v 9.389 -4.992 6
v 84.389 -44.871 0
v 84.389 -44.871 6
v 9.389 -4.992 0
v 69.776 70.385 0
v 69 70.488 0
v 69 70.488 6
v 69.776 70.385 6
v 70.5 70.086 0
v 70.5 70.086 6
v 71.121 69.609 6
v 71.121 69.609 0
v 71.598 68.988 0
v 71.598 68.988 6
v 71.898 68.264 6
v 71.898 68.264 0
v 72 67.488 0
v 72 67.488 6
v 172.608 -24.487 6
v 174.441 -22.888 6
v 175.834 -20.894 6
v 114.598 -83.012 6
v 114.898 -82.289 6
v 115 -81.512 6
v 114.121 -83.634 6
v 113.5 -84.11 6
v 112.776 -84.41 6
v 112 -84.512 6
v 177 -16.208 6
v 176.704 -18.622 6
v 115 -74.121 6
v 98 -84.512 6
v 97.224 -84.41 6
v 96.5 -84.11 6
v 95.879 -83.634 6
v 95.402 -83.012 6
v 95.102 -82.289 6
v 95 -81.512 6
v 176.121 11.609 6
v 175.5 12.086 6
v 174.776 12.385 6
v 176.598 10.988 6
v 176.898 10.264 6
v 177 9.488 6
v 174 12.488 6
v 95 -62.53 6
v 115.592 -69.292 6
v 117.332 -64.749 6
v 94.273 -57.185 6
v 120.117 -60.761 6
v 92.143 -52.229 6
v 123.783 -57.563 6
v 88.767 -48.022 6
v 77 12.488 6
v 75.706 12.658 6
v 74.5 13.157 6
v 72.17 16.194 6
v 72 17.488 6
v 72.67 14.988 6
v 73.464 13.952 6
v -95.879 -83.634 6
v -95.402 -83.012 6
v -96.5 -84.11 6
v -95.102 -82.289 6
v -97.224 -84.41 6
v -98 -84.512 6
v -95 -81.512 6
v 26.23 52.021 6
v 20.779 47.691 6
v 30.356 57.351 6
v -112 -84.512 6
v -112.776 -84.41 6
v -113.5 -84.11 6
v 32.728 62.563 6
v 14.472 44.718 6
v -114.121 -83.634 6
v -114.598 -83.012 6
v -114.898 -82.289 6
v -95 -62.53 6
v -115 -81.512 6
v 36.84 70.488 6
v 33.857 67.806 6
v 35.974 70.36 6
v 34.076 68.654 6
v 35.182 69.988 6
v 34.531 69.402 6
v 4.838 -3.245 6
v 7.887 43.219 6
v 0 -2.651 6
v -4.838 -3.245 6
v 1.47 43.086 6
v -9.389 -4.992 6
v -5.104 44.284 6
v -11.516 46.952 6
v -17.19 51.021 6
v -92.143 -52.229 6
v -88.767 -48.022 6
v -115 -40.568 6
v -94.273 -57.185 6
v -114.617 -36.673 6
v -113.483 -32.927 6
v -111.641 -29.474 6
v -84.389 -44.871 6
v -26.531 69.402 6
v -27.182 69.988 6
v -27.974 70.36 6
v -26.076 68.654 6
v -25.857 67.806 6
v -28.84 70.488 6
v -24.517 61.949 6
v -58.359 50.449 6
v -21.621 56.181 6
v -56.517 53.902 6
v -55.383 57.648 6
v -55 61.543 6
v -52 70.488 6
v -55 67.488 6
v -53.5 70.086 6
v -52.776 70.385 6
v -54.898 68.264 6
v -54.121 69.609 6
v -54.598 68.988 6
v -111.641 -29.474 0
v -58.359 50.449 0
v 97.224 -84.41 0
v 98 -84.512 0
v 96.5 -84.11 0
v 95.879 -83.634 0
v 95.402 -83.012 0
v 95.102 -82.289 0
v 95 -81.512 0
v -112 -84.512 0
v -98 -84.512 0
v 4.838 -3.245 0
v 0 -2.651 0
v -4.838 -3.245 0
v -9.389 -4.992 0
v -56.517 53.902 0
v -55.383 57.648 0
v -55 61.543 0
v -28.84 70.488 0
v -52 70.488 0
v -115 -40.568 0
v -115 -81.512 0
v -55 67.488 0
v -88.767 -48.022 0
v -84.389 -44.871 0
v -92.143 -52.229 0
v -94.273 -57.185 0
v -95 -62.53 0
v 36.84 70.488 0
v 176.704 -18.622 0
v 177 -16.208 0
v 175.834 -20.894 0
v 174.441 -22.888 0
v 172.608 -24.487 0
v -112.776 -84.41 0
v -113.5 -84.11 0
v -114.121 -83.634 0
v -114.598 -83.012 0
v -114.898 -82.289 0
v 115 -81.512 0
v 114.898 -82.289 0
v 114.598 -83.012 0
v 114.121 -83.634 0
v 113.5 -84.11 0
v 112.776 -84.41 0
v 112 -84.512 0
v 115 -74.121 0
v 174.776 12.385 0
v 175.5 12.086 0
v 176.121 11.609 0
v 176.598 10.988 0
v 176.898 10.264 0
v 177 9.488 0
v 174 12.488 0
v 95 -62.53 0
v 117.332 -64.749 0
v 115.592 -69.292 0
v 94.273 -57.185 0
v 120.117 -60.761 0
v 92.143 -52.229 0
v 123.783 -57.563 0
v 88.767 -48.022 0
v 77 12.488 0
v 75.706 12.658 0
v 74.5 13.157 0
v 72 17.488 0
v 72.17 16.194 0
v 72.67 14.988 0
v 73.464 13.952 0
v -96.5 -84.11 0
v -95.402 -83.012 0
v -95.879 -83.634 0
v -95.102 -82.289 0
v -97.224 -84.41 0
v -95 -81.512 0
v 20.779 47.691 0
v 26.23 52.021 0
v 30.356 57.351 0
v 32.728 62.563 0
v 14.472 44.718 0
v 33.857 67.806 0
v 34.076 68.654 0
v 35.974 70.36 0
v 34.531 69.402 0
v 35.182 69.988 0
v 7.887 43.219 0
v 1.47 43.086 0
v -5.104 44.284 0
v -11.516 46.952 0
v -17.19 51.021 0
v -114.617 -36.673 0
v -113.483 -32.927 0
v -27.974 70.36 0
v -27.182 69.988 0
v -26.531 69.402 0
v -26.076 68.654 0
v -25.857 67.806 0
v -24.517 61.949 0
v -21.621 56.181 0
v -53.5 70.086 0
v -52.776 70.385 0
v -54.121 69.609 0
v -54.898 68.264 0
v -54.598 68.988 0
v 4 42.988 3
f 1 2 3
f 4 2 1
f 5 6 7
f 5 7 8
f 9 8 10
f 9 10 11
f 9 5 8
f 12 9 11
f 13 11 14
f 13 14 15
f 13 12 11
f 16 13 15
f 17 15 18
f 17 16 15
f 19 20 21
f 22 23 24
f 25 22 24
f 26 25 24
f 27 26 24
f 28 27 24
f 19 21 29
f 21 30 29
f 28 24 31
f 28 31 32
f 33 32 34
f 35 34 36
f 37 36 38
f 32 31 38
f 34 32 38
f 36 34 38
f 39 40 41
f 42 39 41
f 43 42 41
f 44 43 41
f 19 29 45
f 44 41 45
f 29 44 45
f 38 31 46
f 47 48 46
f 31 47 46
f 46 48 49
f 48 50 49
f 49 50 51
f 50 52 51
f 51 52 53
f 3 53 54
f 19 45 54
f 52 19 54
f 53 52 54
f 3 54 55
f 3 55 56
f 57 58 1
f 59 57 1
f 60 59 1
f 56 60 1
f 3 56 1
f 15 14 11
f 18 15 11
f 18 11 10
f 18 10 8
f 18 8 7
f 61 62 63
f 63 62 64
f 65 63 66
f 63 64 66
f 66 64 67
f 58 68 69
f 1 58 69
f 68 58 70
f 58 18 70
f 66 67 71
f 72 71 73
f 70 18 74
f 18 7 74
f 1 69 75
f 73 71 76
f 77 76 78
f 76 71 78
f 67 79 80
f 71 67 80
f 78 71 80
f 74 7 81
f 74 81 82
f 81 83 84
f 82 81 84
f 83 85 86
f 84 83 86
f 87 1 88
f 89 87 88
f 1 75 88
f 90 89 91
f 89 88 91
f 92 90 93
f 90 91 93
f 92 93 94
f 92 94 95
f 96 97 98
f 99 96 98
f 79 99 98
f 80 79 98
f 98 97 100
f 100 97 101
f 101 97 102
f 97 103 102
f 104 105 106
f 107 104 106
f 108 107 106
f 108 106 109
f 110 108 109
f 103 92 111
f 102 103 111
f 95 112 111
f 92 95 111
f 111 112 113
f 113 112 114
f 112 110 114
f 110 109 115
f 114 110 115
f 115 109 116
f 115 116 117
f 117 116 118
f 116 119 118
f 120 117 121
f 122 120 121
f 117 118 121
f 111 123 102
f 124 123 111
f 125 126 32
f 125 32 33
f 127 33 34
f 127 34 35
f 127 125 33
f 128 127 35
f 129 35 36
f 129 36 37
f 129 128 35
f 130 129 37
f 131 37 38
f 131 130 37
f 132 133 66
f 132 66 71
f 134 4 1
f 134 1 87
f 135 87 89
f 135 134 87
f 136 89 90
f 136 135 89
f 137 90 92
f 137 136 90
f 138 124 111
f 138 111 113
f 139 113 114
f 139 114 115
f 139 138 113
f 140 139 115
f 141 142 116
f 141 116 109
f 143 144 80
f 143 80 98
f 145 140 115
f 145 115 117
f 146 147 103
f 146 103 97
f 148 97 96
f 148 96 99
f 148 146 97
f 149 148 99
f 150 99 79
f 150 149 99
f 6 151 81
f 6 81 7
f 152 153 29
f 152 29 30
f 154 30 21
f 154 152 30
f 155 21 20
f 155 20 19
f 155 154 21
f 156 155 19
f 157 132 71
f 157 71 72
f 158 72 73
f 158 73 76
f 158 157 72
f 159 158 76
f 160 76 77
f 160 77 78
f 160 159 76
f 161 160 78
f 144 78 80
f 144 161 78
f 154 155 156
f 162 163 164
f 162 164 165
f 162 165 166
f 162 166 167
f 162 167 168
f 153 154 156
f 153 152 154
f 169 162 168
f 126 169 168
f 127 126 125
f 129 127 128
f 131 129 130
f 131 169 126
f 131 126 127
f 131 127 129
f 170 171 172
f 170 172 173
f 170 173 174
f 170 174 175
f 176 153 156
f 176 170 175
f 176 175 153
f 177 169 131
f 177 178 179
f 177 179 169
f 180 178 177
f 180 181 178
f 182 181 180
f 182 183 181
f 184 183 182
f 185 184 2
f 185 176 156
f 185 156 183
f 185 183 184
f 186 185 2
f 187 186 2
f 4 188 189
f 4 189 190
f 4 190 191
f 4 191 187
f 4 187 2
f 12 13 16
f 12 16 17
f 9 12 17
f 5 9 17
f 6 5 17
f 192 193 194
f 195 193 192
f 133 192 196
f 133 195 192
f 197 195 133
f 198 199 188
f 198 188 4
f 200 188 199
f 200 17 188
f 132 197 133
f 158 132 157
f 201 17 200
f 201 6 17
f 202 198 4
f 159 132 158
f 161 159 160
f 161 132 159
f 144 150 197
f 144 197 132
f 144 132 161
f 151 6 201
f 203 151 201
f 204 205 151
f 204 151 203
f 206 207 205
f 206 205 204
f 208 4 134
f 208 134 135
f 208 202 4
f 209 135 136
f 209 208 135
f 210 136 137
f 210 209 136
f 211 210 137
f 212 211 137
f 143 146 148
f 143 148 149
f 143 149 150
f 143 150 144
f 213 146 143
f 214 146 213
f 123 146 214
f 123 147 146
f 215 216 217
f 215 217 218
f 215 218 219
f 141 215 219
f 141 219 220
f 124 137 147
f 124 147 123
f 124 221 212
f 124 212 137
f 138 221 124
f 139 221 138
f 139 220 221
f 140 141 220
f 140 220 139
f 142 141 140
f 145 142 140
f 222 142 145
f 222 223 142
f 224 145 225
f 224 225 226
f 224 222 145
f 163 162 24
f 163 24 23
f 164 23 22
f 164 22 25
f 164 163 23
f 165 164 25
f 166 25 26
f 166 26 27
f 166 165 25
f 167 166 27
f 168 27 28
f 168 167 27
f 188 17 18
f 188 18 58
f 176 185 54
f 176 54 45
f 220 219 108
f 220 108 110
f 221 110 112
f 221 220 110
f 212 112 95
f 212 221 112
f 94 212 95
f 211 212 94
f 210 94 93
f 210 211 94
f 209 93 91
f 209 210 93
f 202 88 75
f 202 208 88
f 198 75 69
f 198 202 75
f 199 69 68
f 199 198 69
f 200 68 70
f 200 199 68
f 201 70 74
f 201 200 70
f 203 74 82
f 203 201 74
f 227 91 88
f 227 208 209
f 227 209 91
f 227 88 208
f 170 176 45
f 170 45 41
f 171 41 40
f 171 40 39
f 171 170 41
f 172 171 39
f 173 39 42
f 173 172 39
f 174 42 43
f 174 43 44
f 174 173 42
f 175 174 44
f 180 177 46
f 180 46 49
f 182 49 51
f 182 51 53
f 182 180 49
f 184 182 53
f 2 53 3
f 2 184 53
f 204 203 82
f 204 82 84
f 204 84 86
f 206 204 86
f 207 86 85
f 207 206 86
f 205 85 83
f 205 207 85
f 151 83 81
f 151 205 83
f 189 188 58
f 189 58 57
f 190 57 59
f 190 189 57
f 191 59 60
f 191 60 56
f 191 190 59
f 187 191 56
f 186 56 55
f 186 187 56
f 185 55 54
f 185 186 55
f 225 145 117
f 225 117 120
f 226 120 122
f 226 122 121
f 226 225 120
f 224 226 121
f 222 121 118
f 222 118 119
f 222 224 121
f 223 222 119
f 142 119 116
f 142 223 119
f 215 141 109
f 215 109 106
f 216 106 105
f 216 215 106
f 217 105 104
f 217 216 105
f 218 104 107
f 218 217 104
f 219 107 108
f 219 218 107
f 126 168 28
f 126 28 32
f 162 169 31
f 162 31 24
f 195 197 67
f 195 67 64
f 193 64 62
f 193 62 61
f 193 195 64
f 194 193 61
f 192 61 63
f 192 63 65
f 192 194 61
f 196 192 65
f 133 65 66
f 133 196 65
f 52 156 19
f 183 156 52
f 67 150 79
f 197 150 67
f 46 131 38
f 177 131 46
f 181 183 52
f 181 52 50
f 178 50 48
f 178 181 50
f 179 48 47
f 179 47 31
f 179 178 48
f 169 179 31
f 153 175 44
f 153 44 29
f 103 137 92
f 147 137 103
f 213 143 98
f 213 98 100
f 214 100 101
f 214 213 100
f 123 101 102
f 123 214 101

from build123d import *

# Parameters (mm, degrees)
EXTRUDE1_DEPTH = 6


with BuildPart() as part:
    # Sketch1 → Extrude1 (new body)
    with BuildSketch(Plane.XY):
        with BuildLine():
            Line((-9.389431256, -4.992449157), (-84.389431256, -44.870656531))
            ThreePointArc((-84.389431256, -44.870656531), (-92.143346014, -52.22884689), (-95, -62.529608388))
            Line((-95, -62.529608388), (-95, -81.512396008))
            ThreePointArc((-95, -81.512396008), (-95.878679656, -83.633716351), (-98, -84.512396008))
            Line((-98, -84.512396008), (-112, -84.512396008))
            ThreePointArc((-112, -84.512396008), (-114.121320344, -83.633716351), (-115, -81.512396008))
            Line((-115, -81.512396008), (-115, -40.567908762))
            ThreePointArc((-115, -40.567908762), (-114.14184053, -34.772225789), (-111.641005887, -29.473904838))
            Line((-111.641005887, -29.473904838), (-58.358994113, 50.449112822))
            ThreePointArc((-58.358994113, 50.449112822), (-55.85815947, 55.747433773), (-55, 61.543116747))
            Line((-55, 61.543116747), (-55, 67.487603992))
            ThreePointArc((-55, 67.487603992), (-54.121320344, 69.608924336), (-52, 70.487603992))
            Line((-52, 70.487603992), (-28.840084091, 70.487603992))
            ThreePointArc((-28.840084091, 70.487603992), (-26.834640517, 69.718791136), (-25.85707081, 67.806401373))
            add(Edge.make_bspline(
                [(-25.85707081, 67.806401373), (-23.204663037, 42.987603992), (4, 42.987603992), (31.204663037, 42.987603992), (33.85707081, 67.806401373)],
                knots=[3.239246064, 3.239246064, 3.239246064, 4.71238898, 4.71238898, 6.185531897, 6.185531897, 6.185531897], degree=2, weights=[1, 0.740776038, 1, 0.740776038, 1]))
            ThreePointArc((33.85707081, 67.806401373), (34.834640517, 69.718791136), (36.840084091, 70.487603992))
            Line((36.840084091, 70.487603992), (69, 70.487603992))
            ThreePointArc((69, 70.487603992), (71.121320344, 69.608924336), (72, 67.487603992))
            Line((72, 67.487603992), (72, 17.487603992))
            ThreePointArc((72, 17.487603992), (73.464466094, 13.952070086), (77, 12.487603992))
            Line((77, 12.487603992), (174, 12.487603992))
            ThreePointArc((174, 12.487603992), (176.121320344, 11.608924336), (177, 9.487603992))
            Line((177, 9.487603992), (177, -16.208108765))
            ThreePointArc((177, -16.208108765), (175.834161378, -20.894001715), (172.608481452, -24.48729567))
            Line((172.608481452, -24.48729567), (123.783037097, -57.562596684))
            ThreePointArc((123.783037097, -57.562596684), (117.331677243, -64.749184594), (115, -74.120970494))
            Line((115, -74.120970494), (115, -81.512396008))
            ThreePointArc((115, -81.512396008), (114.121320344, -83.633716351), (112, -84.512396008))
            Line((112, -84.512396008), (98, -84.512396008))
            ThreePointArc((98, -84.512396008), (95.878679656, -83.633716351), (95, -81.512396008))
            Line((95, -81.512396008), (95, -62.529608388))
            ThreePointArc((95, -62.529608388), (92.143346014, -52.22884689), (84.389431256, -44.870656531))
            Line((84.389431256, -44.870656531), (9.389431256, -4.992449157))
            ThreePointArc((9.389431256, -4.992449157), (0, -2.651401014), (-9.389431256, -4.992449157))
        make_face()
    extrude(amount=EXTRUDE1_DEPTH)


solid = part.part
